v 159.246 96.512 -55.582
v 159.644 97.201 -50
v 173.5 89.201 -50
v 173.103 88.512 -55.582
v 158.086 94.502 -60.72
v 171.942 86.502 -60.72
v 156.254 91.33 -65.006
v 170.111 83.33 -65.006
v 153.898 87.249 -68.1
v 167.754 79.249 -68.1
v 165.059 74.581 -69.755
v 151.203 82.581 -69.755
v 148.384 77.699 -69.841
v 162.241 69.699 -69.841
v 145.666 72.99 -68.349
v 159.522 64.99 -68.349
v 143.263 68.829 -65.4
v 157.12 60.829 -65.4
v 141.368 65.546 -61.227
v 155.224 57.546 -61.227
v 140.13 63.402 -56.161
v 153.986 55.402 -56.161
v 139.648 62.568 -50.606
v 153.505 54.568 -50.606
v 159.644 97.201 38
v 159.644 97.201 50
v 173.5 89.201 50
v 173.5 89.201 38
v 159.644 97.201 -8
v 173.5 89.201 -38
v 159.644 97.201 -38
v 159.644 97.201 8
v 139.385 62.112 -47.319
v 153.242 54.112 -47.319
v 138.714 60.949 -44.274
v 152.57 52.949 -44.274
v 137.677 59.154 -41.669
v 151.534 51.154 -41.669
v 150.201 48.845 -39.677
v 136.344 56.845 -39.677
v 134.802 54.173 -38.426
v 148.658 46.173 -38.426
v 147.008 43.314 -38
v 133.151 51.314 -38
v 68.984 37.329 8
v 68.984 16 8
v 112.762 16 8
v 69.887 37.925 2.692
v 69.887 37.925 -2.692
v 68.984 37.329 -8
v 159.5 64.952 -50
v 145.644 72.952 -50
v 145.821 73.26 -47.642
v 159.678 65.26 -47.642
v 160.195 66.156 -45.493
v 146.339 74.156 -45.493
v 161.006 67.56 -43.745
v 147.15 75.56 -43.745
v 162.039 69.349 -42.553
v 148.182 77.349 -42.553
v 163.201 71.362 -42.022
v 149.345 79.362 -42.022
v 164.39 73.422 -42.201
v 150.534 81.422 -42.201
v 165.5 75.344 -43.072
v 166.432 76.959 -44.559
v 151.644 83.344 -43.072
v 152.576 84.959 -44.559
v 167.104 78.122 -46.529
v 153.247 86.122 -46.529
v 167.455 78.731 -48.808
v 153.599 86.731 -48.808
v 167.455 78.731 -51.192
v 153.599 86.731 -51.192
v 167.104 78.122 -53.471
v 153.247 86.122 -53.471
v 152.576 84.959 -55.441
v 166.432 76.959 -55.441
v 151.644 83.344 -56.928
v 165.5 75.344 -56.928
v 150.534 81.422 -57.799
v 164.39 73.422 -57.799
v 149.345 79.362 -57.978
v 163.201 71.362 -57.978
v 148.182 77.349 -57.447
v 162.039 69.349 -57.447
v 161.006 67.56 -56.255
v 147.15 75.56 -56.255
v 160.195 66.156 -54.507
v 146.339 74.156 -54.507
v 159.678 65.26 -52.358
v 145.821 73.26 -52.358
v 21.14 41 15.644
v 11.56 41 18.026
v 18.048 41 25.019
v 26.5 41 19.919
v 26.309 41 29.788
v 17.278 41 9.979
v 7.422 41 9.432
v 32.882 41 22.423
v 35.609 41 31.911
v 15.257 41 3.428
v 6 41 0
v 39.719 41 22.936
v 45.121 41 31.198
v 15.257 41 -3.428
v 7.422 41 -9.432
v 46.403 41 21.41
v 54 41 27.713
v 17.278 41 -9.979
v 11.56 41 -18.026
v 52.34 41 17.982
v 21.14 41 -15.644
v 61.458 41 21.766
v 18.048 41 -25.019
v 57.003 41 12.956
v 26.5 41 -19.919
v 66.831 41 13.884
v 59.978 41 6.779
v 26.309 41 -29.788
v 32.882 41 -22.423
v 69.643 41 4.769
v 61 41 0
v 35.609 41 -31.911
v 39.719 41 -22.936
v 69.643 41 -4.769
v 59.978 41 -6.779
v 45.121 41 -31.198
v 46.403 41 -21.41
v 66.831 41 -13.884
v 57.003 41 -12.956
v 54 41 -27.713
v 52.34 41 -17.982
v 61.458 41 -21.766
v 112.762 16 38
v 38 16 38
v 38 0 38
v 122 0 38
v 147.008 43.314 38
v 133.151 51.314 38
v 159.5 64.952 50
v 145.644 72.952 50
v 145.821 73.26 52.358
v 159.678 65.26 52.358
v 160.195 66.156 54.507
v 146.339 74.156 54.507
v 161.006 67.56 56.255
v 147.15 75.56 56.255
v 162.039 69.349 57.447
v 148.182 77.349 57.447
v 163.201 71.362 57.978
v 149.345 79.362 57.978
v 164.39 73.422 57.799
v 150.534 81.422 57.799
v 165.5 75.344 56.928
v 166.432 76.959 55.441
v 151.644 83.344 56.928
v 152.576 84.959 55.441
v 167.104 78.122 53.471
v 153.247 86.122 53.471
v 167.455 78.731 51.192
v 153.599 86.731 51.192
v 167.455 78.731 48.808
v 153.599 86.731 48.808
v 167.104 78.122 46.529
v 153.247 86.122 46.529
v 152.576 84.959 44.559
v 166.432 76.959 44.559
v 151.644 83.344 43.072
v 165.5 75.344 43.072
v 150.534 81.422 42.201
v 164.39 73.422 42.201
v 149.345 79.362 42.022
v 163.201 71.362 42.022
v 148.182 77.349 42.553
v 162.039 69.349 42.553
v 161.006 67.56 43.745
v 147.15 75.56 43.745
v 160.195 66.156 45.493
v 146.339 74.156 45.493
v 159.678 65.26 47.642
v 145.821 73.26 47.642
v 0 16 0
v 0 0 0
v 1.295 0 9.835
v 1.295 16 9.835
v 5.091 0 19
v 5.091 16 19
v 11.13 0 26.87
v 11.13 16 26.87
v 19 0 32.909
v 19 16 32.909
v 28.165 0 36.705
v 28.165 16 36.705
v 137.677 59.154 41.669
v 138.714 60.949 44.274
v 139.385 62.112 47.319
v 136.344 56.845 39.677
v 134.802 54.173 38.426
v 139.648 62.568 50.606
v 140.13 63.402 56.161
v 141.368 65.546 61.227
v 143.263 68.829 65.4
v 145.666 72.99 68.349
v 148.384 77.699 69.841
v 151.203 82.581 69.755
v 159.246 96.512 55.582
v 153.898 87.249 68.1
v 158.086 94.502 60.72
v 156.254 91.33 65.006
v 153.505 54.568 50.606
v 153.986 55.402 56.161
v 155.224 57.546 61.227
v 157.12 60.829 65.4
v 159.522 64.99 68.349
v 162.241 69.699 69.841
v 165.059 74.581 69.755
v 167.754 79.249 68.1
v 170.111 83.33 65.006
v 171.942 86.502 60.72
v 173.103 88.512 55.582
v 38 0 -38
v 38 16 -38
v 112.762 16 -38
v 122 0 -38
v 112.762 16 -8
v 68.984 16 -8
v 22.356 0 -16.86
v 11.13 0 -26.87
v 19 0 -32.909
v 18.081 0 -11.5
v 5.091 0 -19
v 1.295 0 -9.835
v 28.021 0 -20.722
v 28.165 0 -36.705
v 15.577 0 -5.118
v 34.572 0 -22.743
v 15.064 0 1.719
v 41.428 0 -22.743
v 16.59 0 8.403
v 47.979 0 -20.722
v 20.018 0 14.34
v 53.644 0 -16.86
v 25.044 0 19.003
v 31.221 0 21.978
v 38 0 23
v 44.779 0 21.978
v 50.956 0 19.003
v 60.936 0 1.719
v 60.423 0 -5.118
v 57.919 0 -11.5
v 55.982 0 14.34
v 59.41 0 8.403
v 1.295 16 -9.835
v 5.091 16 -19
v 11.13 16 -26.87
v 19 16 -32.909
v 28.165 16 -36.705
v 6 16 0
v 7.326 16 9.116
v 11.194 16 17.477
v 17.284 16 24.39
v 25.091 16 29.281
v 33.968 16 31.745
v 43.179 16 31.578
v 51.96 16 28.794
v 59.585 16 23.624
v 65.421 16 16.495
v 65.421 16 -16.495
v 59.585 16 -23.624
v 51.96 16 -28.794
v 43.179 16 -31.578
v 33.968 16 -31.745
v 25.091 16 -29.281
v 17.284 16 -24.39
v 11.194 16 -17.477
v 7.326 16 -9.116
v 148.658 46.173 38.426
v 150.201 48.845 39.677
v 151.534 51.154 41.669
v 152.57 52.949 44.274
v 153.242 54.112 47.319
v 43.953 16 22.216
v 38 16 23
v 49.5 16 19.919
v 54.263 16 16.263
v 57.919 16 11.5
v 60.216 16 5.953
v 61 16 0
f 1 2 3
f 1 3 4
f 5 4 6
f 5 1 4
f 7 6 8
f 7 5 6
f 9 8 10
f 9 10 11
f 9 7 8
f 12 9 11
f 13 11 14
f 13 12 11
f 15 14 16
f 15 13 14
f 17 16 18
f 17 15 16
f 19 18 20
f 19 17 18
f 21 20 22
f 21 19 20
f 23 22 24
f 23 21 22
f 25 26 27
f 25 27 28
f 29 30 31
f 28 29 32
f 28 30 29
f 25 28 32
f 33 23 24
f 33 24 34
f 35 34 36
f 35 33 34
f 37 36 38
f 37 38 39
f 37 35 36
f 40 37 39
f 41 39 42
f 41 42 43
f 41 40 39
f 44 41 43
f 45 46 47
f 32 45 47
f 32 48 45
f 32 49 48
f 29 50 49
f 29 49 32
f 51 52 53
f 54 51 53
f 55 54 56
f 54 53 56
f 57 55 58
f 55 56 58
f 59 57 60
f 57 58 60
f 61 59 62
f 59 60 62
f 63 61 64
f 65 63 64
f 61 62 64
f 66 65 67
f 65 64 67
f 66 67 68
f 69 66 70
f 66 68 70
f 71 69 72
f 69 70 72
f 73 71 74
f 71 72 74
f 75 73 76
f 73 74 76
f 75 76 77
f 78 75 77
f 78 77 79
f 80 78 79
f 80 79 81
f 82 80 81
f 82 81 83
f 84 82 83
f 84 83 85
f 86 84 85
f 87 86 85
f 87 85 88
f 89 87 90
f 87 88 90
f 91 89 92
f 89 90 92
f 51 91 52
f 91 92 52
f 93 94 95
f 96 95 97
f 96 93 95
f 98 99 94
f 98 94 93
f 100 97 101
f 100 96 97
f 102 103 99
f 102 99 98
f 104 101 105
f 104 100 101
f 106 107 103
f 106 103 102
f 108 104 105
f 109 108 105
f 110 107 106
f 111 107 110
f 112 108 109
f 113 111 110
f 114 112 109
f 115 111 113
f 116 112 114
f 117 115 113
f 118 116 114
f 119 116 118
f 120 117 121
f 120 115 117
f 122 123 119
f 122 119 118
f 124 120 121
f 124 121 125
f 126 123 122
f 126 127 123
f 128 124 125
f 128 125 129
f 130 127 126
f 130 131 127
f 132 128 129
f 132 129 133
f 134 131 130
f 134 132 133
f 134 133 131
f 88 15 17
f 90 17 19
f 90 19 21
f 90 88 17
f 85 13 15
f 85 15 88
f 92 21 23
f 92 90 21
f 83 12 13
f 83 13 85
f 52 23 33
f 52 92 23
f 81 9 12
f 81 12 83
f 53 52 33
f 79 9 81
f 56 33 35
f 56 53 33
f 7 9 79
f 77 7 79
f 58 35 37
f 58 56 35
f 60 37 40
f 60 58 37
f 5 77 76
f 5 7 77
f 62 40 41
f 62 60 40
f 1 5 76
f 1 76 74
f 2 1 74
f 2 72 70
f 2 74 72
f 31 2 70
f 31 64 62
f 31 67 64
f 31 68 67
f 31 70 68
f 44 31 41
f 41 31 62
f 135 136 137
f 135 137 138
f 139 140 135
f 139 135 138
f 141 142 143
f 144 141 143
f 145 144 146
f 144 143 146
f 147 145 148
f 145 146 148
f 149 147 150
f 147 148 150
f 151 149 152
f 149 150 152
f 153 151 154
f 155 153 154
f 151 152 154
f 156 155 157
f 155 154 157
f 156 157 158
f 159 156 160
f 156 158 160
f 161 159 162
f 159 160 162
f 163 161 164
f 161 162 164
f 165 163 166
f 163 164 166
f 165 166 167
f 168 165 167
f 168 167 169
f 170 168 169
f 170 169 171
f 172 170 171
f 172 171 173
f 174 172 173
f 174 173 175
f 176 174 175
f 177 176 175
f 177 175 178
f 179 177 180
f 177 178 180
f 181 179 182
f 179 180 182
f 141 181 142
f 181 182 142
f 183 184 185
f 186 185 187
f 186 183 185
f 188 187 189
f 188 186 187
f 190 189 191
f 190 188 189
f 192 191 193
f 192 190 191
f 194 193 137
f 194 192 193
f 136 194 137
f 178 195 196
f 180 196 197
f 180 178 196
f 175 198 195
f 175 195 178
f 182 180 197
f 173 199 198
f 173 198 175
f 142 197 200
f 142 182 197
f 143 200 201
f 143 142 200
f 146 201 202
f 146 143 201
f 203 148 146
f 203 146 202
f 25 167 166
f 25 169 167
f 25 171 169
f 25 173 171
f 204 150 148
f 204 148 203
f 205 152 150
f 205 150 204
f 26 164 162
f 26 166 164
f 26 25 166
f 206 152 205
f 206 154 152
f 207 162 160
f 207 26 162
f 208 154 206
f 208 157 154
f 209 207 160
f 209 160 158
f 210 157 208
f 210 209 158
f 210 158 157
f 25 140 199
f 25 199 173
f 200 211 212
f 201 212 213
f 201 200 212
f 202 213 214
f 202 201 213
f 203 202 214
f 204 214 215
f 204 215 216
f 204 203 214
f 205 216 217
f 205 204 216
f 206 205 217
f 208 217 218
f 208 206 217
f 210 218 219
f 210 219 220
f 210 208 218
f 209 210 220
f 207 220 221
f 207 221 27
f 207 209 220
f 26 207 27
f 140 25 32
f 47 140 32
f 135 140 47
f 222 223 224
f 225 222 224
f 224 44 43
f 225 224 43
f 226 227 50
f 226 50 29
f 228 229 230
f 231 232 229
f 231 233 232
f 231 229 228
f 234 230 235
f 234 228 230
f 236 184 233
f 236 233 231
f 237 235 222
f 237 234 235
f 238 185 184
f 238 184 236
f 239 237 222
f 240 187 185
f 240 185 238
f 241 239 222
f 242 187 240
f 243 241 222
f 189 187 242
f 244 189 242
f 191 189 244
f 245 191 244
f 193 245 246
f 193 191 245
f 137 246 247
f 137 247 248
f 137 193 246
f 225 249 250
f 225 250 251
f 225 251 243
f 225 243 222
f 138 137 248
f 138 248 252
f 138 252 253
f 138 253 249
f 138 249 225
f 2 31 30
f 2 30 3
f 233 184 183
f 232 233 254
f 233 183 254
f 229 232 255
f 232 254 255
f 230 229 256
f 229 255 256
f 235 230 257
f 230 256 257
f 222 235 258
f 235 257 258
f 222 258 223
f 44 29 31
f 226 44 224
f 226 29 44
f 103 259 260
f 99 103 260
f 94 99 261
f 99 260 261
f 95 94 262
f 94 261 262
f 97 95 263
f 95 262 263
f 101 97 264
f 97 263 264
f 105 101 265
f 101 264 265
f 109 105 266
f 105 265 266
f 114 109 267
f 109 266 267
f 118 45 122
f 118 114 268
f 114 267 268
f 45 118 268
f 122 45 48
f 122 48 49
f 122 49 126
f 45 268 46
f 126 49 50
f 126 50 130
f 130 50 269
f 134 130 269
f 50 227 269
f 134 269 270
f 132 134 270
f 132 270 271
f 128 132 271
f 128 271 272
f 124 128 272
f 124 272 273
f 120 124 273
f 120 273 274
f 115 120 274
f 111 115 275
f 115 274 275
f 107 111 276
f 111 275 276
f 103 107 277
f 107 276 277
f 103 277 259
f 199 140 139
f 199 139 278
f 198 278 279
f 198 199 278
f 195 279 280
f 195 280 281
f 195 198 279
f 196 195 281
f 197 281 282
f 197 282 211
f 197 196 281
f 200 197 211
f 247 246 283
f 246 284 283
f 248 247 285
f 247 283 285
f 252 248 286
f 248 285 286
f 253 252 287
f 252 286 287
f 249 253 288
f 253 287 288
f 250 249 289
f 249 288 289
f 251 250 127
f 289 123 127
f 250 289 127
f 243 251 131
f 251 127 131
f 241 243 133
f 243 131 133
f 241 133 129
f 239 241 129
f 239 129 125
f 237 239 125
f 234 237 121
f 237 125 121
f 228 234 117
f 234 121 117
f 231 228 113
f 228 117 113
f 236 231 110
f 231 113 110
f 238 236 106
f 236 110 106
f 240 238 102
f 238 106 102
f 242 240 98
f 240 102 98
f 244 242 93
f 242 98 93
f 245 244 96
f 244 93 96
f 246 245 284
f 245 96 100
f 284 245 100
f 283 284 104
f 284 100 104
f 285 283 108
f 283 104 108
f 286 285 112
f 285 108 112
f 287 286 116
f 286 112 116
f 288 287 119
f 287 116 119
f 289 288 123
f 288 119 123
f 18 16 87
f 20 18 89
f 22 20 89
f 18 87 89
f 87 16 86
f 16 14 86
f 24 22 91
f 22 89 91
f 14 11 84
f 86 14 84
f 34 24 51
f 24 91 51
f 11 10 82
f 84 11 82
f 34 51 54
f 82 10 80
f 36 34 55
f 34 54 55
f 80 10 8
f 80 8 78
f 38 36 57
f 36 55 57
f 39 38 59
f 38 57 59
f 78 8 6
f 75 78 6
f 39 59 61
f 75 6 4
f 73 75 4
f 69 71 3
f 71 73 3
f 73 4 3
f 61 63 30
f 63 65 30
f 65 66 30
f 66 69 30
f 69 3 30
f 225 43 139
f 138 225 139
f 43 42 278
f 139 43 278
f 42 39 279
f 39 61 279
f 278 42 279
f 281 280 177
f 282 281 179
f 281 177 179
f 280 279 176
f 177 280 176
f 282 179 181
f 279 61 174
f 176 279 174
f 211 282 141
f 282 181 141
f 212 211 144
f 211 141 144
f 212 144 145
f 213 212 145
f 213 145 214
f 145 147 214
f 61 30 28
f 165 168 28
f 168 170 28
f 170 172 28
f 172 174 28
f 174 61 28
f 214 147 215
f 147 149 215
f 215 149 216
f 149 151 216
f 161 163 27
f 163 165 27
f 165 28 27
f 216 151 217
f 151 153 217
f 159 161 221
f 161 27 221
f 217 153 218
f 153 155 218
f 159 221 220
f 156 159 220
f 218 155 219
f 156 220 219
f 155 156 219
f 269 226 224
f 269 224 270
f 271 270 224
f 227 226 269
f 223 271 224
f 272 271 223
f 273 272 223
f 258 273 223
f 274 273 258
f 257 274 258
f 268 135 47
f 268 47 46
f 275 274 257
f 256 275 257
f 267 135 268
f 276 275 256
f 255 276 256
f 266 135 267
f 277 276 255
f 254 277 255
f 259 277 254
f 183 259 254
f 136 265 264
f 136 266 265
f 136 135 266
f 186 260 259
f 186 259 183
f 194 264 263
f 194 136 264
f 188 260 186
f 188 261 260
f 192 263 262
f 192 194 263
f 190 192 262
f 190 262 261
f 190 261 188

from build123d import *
from build123d.topology import SkipClean

# Parameters (mm, degrees)
EXTRUDE_1_DEPTH     = 38
SKETCH_3_R          = 8
EXTRUDE_2_DEPTH     = 16
EXTRUDE_3_DEPTH     = 25
CUT_EXTRUDE_1_REACH = 205.95
SKETCH_5_4_R        = 23
CUT_EXTRUDE_2_REACH = 205.95
RIB_1_REACH         = 212.832
SKETCH_9_WALL_W     = 531.09195721
SKETCH_9_WALL_H     = 16


with BuildPart() as part:
    # 草图1 → 凸台-拉伸1 (new, symmetric)
    with BuildSketch(Plane.XY):
        Polygon((0, 0), (122, 0), (173.5, 89.20061659), (159.643593539, 97.20061659), (112.762395693, 16), (0, 16), align=None)
    extrude(amount=EXTRUDE_1_DEPTH, both=True)

    # 草图3 → 凸台-拉伸2 (add)
    # profile 1 of 2: a face of its own
    with BuildSketch(Plane(origin=(77.643593539, -44.827549631, 0), x_dir=(0, 0, 1), z_dir=(-0.86602540378444, 0.49999999999999784, 0))):
        with BuildLine():
            Line((-38, 164), (-50, 164))
            ThreePointArc((-50, 164), (-69.997703657, 144.3030651), (-50.606060606, 124.009184845))
            ThreePointArc((-50.606060606, 124.009184845), (-41.669372687, 120.067193105), (-38, 111.015154995))
            Line((-38, 111.015154995), (-38, 164))
        make_face()
        with Locations(Location((-50, 144, 0), (0, 0, 270))):
            Circle(SKETCH_3_R, mode=Mode.SUBTRACT)
    # profile 2 of 2: a face of its own
    with BuildSketch(Plane(origin=(77.643593539, -44.827549631, 0), x_dir=(0, 0, 1), z_dir=(-0.86602540378444, 0.49999999999999784, 0))):
        with BuildLine():
            Line((50, 164), (38, 164))
            Line((38, 164), (38, 111.015154995))
            ThreePointArc((38, 111.015154995), (41.669372687, 120.067193105), (50.606060606, 124.009184845))
            ThreePointArc((50.606060606, 124.009184845), (69.997703657, 144.3030651), (50, 164))
        make_face()
        with Locations(Location((50, 144, 0), (0, 0, 270))):
            Circle(SKETCH_3_R, mode=Mode.SUBTRACT)
    extrude(amount=-EXTRUDE_2_DEPTH)

    # 草图5 → 凸台-拉伸3 (add)
    with BuildSketch(Plane(origin=(0, 16, 0), x_dir=(1, 0, 0), z_dir=(0, 1, 0))):
        with BuildLine():
            ThreePointArc((15, 0), (38, 23), (61, 0))
            Line((61, 0), (70, 0))
            ThreePointArc((70, 0), (38, 32), (6, 0))
            Line((6, 0), (15, 0))
        make_face()
        with BuildLine():
            Line((70, 0), (61, 0))
            ThreePointArc((61, 0), (38, -23), (15, 0))
            Line((15, 0), (6, 0))
            ThreePointArc((6, 0), (38, -32), (70, 0))
        make_face()
    extrude(amount=EXTRUDE_3_DEPTH)

    # 草图5<4> → 切除-拉伸1 (cut, up to next)
    with BuildSketch(Plane(origin=(0, 16, 0), x_dir=(1, 0, 0), z_dir=(0, 1, 0)), mode=Mode.PRIVATE) as cut_extrude_1_sk1:
        with Locations(Location((38, 0, 0), (0, 0, 270))):
            Circle(SKETCH_5_4_R)
    cut_extrude_1_tool1 = extrude(cut_extrude_1_sk1.sketch, amount=-CUT_EXTRUDE_1_REACH, mode=Mode.PRIVATE) & part.part
    add(cut_extrude_1_tool1.solids().sort_by_distance((38, 16, 0))[0], mode=Mode.SUBTRACT)

    # 草图6 → 切除-拉伸2 (cut, up to next)
    with BuildSketch(Plane(origin=(0, 16, 0), x_dir=(1, 0, 0), z_dir=(0, 1, 0)), mode=Mode.PRIVATE) as cut_extrude_2_sk1:
        with BuildLine():
            Line((38, 38), (0, 38))
            Line((0, 38), (0, 0))
            ThreePointArc((0, 0), (11.129942315, 26.870057685), (38, 38))
        make_face()
    cut_extrude_2_tool1 = extrude(cut_extrude_2_sk1.sketch, amount=-CUT_EXTRUDE_2_REACH, mode=Mode.PRIVATE) & part.part
    cut_extrude_2 = cut_extrude_2_tool1.solids().sort_by_distance((8.487982, 16, -29.512018))[0]
    add(cut_extrude_2, mode=Mode.SUBTRACT)

    # 镜向1: 切除-拉伸2 across plane
    with SkipClean():  # the faces are left unmerged after this step: merging them gives an invalid solid
        add(cut_extrude_2.mirror(Plane.XY), mode=Mode.SUBTRACT)

    # 草图9 wall → 筋1 (add, up to next)
    with BuildSketch(Plane(origin=(114.821796769, 67.600308295, 0), x_dir=(0.834455975571, 0.551074609136, 0), z_dir=(-0.551074609136, 0.834455975571, 0)), mode=Mode.PRIVATE) as rib_1_sk1:
        Rectangle(SKETCH_9_WALL_W, SKETCH_9_WALL_H)
    rib_1_tool1 = extrude(rib_1_sk1.sketch, amount=-RIB_1_REACH, mode=Mode.PRIVATE) - part.part
    add(rib_1_tool1.solids().sort_by_distance((114.821796769, 67.600308295, 0))[0])


solid = part.part
